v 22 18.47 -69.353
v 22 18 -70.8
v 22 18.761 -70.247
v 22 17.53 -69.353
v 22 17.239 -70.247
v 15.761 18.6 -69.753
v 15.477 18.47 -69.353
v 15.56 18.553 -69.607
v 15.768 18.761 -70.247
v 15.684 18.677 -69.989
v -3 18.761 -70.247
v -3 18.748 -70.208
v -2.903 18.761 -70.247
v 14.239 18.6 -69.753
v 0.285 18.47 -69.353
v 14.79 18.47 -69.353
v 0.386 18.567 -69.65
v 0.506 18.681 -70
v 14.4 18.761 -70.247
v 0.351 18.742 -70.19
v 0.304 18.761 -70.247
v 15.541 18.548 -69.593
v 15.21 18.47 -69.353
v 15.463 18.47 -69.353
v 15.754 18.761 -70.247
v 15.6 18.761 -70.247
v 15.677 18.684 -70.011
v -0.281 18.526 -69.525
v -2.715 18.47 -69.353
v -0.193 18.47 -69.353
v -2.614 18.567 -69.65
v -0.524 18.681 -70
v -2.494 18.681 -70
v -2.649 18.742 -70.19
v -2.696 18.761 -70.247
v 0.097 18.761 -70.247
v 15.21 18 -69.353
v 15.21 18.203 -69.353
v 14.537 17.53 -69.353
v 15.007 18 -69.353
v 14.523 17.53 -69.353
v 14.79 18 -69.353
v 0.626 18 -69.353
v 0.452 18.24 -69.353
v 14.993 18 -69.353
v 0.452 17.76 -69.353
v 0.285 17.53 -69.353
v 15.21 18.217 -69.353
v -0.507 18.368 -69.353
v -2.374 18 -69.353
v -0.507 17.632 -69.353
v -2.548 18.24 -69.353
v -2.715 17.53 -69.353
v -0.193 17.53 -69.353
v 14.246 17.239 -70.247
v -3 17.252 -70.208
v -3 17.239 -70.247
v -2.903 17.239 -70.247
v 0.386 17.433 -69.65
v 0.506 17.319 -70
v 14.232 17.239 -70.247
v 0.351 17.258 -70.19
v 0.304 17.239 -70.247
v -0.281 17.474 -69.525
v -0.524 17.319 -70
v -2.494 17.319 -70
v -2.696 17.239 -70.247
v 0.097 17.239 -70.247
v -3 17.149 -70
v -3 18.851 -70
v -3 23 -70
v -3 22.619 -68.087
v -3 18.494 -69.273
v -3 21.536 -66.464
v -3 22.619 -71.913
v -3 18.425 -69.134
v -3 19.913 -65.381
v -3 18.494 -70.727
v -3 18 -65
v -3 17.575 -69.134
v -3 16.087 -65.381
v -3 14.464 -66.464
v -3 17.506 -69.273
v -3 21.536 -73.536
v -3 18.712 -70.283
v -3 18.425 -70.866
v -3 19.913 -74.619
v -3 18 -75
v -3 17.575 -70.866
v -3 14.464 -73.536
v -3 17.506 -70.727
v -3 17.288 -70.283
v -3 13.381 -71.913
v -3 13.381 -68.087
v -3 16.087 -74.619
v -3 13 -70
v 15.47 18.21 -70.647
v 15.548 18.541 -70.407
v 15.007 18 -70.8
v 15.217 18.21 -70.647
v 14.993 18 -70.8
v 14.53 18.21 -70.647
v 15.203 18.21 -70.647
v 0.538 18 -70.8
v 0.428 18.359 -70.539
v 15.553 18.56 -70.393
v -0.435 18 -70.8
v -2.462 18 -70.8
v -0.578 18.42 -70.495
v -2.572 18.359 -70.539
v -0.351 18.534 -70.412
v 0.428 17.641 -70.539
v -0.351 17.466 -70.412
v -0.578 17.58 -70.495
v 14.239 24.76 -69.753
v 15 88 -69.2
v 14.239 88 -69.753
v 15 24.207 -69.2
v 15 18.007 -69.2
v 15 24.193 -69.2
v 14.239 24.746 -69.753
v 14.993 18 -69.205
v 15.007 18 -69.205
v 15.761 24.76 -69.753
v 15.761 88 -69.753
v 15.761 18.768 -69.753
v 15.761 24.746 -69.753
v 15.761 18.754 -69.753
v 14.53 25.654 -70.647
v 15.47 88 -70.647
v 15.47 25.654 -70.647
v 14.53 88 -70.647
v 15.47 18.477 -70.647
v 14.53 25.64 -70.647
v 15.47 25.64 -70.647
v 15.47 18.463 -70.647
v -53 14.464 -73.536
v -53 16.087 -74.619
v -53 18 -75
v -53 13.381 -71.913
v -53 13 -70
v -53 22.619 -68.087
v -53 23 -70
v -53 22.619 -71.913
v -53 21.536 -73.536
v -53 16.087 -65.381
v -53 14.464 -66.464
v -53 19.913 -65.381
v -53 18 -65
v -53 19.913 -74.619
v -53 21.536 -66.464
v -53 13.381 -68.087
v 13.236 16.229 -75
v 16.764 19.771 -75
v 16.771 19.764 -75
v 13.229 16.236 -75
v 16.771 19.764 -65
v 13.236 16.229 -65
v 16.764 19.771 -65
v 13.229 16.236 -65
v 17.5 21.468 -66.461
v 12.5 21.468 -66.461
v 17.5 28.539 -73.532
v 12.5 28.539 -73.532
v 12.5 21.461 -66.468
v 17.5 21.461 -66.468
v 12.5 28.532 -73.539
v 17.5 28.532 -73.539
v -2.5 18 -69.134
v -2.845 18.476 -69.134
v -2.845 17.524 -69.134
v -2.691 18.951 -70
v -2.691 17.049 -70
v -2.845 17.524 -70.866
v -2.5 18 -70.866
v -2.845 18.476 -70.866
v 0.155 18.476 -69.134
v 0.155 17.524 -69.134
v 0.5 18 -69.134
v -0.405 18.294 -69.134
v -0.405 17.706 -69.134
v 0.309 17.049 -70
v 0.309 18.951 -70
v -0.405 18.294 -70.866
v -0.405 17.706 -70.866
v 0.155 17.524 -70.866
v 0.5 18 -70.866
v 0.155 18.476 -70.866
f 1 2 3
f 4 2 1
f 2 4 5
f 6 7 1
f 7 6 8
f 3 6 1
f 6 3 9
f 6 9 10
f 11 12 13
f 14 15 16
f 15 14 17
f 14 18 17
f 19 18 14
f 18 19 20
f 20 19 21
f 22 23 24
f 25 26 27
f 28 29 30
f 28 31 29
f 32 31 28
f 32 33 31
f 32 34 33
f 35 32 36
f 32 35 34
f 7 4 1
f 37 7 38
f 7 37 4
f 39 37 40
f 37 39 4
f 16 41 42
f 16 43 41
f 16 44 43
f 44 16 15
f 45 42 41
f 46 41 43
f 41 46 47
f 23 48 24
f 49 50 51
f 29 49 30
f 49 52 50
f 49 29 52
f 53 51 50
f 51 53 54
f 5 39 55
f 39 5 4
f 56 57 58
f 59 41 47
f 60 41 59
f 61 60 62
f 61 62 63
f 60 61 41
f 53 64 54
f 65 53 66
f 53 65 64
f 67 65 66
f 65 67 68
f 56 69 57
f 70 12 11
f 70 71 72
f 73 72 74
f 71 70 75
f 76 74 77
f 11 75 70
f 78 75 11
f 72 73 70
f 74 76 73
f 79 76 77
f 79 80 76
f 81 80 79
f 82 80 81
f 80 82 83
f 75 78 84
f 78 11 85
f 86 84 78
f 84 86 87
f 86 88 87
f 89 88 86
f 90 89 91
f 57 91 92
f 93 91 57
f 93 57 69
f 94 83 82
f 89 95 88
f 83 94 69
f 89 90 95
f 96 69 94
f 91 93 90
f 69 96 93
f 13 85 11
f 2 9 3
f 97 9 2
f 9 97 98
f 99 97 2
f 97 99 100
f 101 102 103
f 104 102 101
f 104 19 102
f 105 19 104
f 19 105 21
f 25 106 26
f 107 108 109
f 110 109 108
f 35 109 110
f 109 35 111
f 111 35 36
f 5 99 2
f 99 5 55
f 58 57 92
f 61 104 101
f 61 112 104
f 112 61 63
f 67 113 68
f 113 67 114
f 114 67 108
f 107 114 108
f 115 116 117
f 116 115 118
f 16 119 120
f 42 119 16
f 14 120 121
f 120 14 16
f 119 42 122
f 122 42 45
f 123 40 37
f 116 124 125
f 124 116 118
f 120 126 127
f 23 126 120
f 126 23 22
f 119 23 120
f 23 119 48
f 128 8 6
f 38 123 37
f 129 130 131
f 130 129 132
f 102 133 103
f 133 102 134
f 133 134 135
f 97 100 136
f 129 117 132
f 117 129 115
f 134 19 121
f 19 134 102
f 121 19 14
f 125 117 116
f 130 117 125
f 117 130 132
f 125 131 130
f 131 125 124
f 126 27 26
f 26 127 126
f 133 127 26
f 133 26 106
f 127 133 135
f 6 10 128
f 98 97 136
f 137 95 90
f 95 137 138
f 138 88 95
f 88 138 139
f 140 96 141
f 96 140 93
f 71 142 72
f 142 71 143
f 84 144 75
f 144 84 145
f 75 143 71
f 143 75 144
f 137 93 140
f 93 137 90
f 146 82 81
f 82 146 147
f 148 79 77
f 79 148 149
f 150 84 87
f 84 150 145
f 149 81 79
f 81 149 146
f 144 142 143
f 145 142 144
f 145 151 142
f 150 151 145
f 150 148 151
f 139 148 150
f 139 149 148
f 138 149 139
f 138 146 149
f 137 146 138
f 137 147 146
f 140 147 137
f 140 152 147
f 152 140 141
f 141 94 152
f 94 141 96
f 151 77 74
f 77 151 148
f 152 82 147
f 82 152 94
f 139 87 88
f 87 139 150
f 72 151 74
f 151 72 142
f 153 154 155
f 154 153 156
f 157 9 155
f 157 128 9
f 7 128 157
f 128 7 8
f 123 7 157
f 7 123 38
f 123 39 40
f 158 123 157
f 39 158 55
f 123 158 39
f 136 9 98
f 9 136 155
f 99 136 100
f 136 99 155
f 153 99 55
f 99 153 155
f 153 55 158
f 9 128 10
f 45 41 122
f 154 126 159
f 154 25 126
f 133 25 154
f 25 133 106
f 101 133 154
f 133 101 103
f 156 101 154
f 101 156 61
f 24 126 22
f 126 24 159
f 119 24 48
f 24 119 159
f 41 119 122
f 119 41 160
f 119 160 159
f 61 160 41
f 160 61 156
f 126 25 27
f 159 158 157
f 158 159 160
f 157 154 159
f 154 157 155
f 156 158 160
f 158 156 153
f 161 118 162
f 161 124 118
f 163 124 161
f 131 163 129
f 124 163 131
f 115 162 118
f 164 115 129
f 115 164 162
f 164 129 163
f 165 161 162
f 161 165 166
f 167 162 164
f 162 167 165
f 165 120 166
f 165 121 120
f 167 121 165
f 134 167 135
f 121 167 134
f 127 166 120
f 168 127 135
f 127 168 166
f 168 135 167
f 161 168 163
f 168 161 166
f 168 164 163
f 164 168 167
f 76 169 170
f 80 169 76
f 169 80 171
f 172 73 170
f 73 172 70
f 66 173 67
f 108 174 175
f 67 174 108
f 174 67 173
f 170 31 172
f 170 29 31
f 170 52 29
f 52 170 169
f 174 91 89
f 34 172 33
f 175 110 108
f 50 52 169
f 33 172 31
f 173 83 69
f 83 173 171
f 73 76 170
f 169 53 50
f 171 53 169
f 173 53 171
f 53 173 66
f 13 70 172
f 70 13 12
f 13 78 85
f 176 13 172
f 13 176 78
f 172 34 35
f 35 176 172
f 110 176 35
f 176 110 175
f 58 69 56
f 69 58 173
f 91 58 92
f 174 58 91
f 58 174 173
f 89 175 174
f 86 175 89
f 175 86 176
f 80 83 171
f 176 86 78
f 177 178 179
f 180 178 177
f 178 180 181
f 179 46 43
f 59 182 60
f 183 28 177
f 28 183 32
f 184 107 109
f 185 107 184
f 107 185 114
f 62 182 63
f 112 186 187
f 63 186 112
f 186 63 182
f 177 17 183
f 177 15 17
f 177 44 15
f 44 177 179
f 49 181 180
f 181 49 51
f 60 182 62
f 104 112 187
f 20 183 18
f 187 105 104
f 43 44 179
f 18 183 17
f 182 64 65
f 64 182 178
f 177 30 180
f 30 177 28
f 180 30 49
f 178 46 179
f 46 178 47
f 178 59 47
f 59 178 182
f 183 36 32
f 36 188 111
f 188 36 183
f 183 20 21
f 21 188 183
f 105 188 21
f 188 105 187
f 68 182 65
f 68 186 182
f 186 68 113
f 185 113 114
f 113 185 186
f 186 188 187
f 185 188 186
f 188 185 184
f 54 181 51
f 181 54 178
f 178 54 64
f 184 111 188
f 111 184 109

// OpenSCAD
laser_base_point = [-3.0,18.0,-70.0];
laser_look_at = [0.0,18.0,-70.0];

mirror1_base_point=[15.0,18.0,-70];
mirror1_look_at=[-1.0, 1.0, 0.0]+mirror1_base_point;
deflection1 = -30;

mirror2_base_point=[15.0,25.0,-70];
mirror2_look_at=[ 0.0,-1.0,-1.0]+mirror2_base_point;

module peachy_mirror(base_point,look_at) {
    translate(base_point){
        rotate(to_polar(base_point,look_at)){
          rotate([180 ,0,0]){
              cube([10,5,0.01], center = true);
          }

        }
    }
}

function vec_to_polar(dx,dy,dz) = [0 , acos(dz / sqrt(dx*dx + dy*dy + dz*dz)), atan2(dy,dx)];

function to_polar(base_point,look_at) = vec_to_polar(
    look_at[0] - base_point[0],
    look_at[1] - base_point[1],
    look_at[2] - base_point[2]
    );


module laser_beam(base_point,look_at) {
    translate(base_point){
        rotate(to_polar(base_point,look_at)){
              cylinder(h=25, r=0.8);
        }
    }
    
    translate(mirror1_base_point)
        //rotate(to_polar(mirror1_base_point,mirror1_look_at))
          mirror(mirror1_look_at-mirror1_base_point)
          rotate([180 ,0,0])
            rotate(to_polar(base_point,look_at))
              cylinder(h=70, r=0.8);

}

module laser(base_point,look_at) {
    translate(base_point){
        rotate(to_polar(base_point,look_at)){
              rotate([180,0,0]){
                  cylinder(h =50, r =5);
           }
        }
    }
}



color("grey")
laser(laser_base_point, laser_look_at);

color("blue")
laser_beam(laser_base_point, laser_look_at);

color("green")
  peachy_mirror(mirror1_base_point,mirror1_look_at);


color("red")
  peachy_mirror(mirror2_base_point,mirror2_look_at);


color("green")
translate(laser_base_point){
    sphere(1);
}

color("red")
translate(laser_look_at){
    sphere(1);
}
